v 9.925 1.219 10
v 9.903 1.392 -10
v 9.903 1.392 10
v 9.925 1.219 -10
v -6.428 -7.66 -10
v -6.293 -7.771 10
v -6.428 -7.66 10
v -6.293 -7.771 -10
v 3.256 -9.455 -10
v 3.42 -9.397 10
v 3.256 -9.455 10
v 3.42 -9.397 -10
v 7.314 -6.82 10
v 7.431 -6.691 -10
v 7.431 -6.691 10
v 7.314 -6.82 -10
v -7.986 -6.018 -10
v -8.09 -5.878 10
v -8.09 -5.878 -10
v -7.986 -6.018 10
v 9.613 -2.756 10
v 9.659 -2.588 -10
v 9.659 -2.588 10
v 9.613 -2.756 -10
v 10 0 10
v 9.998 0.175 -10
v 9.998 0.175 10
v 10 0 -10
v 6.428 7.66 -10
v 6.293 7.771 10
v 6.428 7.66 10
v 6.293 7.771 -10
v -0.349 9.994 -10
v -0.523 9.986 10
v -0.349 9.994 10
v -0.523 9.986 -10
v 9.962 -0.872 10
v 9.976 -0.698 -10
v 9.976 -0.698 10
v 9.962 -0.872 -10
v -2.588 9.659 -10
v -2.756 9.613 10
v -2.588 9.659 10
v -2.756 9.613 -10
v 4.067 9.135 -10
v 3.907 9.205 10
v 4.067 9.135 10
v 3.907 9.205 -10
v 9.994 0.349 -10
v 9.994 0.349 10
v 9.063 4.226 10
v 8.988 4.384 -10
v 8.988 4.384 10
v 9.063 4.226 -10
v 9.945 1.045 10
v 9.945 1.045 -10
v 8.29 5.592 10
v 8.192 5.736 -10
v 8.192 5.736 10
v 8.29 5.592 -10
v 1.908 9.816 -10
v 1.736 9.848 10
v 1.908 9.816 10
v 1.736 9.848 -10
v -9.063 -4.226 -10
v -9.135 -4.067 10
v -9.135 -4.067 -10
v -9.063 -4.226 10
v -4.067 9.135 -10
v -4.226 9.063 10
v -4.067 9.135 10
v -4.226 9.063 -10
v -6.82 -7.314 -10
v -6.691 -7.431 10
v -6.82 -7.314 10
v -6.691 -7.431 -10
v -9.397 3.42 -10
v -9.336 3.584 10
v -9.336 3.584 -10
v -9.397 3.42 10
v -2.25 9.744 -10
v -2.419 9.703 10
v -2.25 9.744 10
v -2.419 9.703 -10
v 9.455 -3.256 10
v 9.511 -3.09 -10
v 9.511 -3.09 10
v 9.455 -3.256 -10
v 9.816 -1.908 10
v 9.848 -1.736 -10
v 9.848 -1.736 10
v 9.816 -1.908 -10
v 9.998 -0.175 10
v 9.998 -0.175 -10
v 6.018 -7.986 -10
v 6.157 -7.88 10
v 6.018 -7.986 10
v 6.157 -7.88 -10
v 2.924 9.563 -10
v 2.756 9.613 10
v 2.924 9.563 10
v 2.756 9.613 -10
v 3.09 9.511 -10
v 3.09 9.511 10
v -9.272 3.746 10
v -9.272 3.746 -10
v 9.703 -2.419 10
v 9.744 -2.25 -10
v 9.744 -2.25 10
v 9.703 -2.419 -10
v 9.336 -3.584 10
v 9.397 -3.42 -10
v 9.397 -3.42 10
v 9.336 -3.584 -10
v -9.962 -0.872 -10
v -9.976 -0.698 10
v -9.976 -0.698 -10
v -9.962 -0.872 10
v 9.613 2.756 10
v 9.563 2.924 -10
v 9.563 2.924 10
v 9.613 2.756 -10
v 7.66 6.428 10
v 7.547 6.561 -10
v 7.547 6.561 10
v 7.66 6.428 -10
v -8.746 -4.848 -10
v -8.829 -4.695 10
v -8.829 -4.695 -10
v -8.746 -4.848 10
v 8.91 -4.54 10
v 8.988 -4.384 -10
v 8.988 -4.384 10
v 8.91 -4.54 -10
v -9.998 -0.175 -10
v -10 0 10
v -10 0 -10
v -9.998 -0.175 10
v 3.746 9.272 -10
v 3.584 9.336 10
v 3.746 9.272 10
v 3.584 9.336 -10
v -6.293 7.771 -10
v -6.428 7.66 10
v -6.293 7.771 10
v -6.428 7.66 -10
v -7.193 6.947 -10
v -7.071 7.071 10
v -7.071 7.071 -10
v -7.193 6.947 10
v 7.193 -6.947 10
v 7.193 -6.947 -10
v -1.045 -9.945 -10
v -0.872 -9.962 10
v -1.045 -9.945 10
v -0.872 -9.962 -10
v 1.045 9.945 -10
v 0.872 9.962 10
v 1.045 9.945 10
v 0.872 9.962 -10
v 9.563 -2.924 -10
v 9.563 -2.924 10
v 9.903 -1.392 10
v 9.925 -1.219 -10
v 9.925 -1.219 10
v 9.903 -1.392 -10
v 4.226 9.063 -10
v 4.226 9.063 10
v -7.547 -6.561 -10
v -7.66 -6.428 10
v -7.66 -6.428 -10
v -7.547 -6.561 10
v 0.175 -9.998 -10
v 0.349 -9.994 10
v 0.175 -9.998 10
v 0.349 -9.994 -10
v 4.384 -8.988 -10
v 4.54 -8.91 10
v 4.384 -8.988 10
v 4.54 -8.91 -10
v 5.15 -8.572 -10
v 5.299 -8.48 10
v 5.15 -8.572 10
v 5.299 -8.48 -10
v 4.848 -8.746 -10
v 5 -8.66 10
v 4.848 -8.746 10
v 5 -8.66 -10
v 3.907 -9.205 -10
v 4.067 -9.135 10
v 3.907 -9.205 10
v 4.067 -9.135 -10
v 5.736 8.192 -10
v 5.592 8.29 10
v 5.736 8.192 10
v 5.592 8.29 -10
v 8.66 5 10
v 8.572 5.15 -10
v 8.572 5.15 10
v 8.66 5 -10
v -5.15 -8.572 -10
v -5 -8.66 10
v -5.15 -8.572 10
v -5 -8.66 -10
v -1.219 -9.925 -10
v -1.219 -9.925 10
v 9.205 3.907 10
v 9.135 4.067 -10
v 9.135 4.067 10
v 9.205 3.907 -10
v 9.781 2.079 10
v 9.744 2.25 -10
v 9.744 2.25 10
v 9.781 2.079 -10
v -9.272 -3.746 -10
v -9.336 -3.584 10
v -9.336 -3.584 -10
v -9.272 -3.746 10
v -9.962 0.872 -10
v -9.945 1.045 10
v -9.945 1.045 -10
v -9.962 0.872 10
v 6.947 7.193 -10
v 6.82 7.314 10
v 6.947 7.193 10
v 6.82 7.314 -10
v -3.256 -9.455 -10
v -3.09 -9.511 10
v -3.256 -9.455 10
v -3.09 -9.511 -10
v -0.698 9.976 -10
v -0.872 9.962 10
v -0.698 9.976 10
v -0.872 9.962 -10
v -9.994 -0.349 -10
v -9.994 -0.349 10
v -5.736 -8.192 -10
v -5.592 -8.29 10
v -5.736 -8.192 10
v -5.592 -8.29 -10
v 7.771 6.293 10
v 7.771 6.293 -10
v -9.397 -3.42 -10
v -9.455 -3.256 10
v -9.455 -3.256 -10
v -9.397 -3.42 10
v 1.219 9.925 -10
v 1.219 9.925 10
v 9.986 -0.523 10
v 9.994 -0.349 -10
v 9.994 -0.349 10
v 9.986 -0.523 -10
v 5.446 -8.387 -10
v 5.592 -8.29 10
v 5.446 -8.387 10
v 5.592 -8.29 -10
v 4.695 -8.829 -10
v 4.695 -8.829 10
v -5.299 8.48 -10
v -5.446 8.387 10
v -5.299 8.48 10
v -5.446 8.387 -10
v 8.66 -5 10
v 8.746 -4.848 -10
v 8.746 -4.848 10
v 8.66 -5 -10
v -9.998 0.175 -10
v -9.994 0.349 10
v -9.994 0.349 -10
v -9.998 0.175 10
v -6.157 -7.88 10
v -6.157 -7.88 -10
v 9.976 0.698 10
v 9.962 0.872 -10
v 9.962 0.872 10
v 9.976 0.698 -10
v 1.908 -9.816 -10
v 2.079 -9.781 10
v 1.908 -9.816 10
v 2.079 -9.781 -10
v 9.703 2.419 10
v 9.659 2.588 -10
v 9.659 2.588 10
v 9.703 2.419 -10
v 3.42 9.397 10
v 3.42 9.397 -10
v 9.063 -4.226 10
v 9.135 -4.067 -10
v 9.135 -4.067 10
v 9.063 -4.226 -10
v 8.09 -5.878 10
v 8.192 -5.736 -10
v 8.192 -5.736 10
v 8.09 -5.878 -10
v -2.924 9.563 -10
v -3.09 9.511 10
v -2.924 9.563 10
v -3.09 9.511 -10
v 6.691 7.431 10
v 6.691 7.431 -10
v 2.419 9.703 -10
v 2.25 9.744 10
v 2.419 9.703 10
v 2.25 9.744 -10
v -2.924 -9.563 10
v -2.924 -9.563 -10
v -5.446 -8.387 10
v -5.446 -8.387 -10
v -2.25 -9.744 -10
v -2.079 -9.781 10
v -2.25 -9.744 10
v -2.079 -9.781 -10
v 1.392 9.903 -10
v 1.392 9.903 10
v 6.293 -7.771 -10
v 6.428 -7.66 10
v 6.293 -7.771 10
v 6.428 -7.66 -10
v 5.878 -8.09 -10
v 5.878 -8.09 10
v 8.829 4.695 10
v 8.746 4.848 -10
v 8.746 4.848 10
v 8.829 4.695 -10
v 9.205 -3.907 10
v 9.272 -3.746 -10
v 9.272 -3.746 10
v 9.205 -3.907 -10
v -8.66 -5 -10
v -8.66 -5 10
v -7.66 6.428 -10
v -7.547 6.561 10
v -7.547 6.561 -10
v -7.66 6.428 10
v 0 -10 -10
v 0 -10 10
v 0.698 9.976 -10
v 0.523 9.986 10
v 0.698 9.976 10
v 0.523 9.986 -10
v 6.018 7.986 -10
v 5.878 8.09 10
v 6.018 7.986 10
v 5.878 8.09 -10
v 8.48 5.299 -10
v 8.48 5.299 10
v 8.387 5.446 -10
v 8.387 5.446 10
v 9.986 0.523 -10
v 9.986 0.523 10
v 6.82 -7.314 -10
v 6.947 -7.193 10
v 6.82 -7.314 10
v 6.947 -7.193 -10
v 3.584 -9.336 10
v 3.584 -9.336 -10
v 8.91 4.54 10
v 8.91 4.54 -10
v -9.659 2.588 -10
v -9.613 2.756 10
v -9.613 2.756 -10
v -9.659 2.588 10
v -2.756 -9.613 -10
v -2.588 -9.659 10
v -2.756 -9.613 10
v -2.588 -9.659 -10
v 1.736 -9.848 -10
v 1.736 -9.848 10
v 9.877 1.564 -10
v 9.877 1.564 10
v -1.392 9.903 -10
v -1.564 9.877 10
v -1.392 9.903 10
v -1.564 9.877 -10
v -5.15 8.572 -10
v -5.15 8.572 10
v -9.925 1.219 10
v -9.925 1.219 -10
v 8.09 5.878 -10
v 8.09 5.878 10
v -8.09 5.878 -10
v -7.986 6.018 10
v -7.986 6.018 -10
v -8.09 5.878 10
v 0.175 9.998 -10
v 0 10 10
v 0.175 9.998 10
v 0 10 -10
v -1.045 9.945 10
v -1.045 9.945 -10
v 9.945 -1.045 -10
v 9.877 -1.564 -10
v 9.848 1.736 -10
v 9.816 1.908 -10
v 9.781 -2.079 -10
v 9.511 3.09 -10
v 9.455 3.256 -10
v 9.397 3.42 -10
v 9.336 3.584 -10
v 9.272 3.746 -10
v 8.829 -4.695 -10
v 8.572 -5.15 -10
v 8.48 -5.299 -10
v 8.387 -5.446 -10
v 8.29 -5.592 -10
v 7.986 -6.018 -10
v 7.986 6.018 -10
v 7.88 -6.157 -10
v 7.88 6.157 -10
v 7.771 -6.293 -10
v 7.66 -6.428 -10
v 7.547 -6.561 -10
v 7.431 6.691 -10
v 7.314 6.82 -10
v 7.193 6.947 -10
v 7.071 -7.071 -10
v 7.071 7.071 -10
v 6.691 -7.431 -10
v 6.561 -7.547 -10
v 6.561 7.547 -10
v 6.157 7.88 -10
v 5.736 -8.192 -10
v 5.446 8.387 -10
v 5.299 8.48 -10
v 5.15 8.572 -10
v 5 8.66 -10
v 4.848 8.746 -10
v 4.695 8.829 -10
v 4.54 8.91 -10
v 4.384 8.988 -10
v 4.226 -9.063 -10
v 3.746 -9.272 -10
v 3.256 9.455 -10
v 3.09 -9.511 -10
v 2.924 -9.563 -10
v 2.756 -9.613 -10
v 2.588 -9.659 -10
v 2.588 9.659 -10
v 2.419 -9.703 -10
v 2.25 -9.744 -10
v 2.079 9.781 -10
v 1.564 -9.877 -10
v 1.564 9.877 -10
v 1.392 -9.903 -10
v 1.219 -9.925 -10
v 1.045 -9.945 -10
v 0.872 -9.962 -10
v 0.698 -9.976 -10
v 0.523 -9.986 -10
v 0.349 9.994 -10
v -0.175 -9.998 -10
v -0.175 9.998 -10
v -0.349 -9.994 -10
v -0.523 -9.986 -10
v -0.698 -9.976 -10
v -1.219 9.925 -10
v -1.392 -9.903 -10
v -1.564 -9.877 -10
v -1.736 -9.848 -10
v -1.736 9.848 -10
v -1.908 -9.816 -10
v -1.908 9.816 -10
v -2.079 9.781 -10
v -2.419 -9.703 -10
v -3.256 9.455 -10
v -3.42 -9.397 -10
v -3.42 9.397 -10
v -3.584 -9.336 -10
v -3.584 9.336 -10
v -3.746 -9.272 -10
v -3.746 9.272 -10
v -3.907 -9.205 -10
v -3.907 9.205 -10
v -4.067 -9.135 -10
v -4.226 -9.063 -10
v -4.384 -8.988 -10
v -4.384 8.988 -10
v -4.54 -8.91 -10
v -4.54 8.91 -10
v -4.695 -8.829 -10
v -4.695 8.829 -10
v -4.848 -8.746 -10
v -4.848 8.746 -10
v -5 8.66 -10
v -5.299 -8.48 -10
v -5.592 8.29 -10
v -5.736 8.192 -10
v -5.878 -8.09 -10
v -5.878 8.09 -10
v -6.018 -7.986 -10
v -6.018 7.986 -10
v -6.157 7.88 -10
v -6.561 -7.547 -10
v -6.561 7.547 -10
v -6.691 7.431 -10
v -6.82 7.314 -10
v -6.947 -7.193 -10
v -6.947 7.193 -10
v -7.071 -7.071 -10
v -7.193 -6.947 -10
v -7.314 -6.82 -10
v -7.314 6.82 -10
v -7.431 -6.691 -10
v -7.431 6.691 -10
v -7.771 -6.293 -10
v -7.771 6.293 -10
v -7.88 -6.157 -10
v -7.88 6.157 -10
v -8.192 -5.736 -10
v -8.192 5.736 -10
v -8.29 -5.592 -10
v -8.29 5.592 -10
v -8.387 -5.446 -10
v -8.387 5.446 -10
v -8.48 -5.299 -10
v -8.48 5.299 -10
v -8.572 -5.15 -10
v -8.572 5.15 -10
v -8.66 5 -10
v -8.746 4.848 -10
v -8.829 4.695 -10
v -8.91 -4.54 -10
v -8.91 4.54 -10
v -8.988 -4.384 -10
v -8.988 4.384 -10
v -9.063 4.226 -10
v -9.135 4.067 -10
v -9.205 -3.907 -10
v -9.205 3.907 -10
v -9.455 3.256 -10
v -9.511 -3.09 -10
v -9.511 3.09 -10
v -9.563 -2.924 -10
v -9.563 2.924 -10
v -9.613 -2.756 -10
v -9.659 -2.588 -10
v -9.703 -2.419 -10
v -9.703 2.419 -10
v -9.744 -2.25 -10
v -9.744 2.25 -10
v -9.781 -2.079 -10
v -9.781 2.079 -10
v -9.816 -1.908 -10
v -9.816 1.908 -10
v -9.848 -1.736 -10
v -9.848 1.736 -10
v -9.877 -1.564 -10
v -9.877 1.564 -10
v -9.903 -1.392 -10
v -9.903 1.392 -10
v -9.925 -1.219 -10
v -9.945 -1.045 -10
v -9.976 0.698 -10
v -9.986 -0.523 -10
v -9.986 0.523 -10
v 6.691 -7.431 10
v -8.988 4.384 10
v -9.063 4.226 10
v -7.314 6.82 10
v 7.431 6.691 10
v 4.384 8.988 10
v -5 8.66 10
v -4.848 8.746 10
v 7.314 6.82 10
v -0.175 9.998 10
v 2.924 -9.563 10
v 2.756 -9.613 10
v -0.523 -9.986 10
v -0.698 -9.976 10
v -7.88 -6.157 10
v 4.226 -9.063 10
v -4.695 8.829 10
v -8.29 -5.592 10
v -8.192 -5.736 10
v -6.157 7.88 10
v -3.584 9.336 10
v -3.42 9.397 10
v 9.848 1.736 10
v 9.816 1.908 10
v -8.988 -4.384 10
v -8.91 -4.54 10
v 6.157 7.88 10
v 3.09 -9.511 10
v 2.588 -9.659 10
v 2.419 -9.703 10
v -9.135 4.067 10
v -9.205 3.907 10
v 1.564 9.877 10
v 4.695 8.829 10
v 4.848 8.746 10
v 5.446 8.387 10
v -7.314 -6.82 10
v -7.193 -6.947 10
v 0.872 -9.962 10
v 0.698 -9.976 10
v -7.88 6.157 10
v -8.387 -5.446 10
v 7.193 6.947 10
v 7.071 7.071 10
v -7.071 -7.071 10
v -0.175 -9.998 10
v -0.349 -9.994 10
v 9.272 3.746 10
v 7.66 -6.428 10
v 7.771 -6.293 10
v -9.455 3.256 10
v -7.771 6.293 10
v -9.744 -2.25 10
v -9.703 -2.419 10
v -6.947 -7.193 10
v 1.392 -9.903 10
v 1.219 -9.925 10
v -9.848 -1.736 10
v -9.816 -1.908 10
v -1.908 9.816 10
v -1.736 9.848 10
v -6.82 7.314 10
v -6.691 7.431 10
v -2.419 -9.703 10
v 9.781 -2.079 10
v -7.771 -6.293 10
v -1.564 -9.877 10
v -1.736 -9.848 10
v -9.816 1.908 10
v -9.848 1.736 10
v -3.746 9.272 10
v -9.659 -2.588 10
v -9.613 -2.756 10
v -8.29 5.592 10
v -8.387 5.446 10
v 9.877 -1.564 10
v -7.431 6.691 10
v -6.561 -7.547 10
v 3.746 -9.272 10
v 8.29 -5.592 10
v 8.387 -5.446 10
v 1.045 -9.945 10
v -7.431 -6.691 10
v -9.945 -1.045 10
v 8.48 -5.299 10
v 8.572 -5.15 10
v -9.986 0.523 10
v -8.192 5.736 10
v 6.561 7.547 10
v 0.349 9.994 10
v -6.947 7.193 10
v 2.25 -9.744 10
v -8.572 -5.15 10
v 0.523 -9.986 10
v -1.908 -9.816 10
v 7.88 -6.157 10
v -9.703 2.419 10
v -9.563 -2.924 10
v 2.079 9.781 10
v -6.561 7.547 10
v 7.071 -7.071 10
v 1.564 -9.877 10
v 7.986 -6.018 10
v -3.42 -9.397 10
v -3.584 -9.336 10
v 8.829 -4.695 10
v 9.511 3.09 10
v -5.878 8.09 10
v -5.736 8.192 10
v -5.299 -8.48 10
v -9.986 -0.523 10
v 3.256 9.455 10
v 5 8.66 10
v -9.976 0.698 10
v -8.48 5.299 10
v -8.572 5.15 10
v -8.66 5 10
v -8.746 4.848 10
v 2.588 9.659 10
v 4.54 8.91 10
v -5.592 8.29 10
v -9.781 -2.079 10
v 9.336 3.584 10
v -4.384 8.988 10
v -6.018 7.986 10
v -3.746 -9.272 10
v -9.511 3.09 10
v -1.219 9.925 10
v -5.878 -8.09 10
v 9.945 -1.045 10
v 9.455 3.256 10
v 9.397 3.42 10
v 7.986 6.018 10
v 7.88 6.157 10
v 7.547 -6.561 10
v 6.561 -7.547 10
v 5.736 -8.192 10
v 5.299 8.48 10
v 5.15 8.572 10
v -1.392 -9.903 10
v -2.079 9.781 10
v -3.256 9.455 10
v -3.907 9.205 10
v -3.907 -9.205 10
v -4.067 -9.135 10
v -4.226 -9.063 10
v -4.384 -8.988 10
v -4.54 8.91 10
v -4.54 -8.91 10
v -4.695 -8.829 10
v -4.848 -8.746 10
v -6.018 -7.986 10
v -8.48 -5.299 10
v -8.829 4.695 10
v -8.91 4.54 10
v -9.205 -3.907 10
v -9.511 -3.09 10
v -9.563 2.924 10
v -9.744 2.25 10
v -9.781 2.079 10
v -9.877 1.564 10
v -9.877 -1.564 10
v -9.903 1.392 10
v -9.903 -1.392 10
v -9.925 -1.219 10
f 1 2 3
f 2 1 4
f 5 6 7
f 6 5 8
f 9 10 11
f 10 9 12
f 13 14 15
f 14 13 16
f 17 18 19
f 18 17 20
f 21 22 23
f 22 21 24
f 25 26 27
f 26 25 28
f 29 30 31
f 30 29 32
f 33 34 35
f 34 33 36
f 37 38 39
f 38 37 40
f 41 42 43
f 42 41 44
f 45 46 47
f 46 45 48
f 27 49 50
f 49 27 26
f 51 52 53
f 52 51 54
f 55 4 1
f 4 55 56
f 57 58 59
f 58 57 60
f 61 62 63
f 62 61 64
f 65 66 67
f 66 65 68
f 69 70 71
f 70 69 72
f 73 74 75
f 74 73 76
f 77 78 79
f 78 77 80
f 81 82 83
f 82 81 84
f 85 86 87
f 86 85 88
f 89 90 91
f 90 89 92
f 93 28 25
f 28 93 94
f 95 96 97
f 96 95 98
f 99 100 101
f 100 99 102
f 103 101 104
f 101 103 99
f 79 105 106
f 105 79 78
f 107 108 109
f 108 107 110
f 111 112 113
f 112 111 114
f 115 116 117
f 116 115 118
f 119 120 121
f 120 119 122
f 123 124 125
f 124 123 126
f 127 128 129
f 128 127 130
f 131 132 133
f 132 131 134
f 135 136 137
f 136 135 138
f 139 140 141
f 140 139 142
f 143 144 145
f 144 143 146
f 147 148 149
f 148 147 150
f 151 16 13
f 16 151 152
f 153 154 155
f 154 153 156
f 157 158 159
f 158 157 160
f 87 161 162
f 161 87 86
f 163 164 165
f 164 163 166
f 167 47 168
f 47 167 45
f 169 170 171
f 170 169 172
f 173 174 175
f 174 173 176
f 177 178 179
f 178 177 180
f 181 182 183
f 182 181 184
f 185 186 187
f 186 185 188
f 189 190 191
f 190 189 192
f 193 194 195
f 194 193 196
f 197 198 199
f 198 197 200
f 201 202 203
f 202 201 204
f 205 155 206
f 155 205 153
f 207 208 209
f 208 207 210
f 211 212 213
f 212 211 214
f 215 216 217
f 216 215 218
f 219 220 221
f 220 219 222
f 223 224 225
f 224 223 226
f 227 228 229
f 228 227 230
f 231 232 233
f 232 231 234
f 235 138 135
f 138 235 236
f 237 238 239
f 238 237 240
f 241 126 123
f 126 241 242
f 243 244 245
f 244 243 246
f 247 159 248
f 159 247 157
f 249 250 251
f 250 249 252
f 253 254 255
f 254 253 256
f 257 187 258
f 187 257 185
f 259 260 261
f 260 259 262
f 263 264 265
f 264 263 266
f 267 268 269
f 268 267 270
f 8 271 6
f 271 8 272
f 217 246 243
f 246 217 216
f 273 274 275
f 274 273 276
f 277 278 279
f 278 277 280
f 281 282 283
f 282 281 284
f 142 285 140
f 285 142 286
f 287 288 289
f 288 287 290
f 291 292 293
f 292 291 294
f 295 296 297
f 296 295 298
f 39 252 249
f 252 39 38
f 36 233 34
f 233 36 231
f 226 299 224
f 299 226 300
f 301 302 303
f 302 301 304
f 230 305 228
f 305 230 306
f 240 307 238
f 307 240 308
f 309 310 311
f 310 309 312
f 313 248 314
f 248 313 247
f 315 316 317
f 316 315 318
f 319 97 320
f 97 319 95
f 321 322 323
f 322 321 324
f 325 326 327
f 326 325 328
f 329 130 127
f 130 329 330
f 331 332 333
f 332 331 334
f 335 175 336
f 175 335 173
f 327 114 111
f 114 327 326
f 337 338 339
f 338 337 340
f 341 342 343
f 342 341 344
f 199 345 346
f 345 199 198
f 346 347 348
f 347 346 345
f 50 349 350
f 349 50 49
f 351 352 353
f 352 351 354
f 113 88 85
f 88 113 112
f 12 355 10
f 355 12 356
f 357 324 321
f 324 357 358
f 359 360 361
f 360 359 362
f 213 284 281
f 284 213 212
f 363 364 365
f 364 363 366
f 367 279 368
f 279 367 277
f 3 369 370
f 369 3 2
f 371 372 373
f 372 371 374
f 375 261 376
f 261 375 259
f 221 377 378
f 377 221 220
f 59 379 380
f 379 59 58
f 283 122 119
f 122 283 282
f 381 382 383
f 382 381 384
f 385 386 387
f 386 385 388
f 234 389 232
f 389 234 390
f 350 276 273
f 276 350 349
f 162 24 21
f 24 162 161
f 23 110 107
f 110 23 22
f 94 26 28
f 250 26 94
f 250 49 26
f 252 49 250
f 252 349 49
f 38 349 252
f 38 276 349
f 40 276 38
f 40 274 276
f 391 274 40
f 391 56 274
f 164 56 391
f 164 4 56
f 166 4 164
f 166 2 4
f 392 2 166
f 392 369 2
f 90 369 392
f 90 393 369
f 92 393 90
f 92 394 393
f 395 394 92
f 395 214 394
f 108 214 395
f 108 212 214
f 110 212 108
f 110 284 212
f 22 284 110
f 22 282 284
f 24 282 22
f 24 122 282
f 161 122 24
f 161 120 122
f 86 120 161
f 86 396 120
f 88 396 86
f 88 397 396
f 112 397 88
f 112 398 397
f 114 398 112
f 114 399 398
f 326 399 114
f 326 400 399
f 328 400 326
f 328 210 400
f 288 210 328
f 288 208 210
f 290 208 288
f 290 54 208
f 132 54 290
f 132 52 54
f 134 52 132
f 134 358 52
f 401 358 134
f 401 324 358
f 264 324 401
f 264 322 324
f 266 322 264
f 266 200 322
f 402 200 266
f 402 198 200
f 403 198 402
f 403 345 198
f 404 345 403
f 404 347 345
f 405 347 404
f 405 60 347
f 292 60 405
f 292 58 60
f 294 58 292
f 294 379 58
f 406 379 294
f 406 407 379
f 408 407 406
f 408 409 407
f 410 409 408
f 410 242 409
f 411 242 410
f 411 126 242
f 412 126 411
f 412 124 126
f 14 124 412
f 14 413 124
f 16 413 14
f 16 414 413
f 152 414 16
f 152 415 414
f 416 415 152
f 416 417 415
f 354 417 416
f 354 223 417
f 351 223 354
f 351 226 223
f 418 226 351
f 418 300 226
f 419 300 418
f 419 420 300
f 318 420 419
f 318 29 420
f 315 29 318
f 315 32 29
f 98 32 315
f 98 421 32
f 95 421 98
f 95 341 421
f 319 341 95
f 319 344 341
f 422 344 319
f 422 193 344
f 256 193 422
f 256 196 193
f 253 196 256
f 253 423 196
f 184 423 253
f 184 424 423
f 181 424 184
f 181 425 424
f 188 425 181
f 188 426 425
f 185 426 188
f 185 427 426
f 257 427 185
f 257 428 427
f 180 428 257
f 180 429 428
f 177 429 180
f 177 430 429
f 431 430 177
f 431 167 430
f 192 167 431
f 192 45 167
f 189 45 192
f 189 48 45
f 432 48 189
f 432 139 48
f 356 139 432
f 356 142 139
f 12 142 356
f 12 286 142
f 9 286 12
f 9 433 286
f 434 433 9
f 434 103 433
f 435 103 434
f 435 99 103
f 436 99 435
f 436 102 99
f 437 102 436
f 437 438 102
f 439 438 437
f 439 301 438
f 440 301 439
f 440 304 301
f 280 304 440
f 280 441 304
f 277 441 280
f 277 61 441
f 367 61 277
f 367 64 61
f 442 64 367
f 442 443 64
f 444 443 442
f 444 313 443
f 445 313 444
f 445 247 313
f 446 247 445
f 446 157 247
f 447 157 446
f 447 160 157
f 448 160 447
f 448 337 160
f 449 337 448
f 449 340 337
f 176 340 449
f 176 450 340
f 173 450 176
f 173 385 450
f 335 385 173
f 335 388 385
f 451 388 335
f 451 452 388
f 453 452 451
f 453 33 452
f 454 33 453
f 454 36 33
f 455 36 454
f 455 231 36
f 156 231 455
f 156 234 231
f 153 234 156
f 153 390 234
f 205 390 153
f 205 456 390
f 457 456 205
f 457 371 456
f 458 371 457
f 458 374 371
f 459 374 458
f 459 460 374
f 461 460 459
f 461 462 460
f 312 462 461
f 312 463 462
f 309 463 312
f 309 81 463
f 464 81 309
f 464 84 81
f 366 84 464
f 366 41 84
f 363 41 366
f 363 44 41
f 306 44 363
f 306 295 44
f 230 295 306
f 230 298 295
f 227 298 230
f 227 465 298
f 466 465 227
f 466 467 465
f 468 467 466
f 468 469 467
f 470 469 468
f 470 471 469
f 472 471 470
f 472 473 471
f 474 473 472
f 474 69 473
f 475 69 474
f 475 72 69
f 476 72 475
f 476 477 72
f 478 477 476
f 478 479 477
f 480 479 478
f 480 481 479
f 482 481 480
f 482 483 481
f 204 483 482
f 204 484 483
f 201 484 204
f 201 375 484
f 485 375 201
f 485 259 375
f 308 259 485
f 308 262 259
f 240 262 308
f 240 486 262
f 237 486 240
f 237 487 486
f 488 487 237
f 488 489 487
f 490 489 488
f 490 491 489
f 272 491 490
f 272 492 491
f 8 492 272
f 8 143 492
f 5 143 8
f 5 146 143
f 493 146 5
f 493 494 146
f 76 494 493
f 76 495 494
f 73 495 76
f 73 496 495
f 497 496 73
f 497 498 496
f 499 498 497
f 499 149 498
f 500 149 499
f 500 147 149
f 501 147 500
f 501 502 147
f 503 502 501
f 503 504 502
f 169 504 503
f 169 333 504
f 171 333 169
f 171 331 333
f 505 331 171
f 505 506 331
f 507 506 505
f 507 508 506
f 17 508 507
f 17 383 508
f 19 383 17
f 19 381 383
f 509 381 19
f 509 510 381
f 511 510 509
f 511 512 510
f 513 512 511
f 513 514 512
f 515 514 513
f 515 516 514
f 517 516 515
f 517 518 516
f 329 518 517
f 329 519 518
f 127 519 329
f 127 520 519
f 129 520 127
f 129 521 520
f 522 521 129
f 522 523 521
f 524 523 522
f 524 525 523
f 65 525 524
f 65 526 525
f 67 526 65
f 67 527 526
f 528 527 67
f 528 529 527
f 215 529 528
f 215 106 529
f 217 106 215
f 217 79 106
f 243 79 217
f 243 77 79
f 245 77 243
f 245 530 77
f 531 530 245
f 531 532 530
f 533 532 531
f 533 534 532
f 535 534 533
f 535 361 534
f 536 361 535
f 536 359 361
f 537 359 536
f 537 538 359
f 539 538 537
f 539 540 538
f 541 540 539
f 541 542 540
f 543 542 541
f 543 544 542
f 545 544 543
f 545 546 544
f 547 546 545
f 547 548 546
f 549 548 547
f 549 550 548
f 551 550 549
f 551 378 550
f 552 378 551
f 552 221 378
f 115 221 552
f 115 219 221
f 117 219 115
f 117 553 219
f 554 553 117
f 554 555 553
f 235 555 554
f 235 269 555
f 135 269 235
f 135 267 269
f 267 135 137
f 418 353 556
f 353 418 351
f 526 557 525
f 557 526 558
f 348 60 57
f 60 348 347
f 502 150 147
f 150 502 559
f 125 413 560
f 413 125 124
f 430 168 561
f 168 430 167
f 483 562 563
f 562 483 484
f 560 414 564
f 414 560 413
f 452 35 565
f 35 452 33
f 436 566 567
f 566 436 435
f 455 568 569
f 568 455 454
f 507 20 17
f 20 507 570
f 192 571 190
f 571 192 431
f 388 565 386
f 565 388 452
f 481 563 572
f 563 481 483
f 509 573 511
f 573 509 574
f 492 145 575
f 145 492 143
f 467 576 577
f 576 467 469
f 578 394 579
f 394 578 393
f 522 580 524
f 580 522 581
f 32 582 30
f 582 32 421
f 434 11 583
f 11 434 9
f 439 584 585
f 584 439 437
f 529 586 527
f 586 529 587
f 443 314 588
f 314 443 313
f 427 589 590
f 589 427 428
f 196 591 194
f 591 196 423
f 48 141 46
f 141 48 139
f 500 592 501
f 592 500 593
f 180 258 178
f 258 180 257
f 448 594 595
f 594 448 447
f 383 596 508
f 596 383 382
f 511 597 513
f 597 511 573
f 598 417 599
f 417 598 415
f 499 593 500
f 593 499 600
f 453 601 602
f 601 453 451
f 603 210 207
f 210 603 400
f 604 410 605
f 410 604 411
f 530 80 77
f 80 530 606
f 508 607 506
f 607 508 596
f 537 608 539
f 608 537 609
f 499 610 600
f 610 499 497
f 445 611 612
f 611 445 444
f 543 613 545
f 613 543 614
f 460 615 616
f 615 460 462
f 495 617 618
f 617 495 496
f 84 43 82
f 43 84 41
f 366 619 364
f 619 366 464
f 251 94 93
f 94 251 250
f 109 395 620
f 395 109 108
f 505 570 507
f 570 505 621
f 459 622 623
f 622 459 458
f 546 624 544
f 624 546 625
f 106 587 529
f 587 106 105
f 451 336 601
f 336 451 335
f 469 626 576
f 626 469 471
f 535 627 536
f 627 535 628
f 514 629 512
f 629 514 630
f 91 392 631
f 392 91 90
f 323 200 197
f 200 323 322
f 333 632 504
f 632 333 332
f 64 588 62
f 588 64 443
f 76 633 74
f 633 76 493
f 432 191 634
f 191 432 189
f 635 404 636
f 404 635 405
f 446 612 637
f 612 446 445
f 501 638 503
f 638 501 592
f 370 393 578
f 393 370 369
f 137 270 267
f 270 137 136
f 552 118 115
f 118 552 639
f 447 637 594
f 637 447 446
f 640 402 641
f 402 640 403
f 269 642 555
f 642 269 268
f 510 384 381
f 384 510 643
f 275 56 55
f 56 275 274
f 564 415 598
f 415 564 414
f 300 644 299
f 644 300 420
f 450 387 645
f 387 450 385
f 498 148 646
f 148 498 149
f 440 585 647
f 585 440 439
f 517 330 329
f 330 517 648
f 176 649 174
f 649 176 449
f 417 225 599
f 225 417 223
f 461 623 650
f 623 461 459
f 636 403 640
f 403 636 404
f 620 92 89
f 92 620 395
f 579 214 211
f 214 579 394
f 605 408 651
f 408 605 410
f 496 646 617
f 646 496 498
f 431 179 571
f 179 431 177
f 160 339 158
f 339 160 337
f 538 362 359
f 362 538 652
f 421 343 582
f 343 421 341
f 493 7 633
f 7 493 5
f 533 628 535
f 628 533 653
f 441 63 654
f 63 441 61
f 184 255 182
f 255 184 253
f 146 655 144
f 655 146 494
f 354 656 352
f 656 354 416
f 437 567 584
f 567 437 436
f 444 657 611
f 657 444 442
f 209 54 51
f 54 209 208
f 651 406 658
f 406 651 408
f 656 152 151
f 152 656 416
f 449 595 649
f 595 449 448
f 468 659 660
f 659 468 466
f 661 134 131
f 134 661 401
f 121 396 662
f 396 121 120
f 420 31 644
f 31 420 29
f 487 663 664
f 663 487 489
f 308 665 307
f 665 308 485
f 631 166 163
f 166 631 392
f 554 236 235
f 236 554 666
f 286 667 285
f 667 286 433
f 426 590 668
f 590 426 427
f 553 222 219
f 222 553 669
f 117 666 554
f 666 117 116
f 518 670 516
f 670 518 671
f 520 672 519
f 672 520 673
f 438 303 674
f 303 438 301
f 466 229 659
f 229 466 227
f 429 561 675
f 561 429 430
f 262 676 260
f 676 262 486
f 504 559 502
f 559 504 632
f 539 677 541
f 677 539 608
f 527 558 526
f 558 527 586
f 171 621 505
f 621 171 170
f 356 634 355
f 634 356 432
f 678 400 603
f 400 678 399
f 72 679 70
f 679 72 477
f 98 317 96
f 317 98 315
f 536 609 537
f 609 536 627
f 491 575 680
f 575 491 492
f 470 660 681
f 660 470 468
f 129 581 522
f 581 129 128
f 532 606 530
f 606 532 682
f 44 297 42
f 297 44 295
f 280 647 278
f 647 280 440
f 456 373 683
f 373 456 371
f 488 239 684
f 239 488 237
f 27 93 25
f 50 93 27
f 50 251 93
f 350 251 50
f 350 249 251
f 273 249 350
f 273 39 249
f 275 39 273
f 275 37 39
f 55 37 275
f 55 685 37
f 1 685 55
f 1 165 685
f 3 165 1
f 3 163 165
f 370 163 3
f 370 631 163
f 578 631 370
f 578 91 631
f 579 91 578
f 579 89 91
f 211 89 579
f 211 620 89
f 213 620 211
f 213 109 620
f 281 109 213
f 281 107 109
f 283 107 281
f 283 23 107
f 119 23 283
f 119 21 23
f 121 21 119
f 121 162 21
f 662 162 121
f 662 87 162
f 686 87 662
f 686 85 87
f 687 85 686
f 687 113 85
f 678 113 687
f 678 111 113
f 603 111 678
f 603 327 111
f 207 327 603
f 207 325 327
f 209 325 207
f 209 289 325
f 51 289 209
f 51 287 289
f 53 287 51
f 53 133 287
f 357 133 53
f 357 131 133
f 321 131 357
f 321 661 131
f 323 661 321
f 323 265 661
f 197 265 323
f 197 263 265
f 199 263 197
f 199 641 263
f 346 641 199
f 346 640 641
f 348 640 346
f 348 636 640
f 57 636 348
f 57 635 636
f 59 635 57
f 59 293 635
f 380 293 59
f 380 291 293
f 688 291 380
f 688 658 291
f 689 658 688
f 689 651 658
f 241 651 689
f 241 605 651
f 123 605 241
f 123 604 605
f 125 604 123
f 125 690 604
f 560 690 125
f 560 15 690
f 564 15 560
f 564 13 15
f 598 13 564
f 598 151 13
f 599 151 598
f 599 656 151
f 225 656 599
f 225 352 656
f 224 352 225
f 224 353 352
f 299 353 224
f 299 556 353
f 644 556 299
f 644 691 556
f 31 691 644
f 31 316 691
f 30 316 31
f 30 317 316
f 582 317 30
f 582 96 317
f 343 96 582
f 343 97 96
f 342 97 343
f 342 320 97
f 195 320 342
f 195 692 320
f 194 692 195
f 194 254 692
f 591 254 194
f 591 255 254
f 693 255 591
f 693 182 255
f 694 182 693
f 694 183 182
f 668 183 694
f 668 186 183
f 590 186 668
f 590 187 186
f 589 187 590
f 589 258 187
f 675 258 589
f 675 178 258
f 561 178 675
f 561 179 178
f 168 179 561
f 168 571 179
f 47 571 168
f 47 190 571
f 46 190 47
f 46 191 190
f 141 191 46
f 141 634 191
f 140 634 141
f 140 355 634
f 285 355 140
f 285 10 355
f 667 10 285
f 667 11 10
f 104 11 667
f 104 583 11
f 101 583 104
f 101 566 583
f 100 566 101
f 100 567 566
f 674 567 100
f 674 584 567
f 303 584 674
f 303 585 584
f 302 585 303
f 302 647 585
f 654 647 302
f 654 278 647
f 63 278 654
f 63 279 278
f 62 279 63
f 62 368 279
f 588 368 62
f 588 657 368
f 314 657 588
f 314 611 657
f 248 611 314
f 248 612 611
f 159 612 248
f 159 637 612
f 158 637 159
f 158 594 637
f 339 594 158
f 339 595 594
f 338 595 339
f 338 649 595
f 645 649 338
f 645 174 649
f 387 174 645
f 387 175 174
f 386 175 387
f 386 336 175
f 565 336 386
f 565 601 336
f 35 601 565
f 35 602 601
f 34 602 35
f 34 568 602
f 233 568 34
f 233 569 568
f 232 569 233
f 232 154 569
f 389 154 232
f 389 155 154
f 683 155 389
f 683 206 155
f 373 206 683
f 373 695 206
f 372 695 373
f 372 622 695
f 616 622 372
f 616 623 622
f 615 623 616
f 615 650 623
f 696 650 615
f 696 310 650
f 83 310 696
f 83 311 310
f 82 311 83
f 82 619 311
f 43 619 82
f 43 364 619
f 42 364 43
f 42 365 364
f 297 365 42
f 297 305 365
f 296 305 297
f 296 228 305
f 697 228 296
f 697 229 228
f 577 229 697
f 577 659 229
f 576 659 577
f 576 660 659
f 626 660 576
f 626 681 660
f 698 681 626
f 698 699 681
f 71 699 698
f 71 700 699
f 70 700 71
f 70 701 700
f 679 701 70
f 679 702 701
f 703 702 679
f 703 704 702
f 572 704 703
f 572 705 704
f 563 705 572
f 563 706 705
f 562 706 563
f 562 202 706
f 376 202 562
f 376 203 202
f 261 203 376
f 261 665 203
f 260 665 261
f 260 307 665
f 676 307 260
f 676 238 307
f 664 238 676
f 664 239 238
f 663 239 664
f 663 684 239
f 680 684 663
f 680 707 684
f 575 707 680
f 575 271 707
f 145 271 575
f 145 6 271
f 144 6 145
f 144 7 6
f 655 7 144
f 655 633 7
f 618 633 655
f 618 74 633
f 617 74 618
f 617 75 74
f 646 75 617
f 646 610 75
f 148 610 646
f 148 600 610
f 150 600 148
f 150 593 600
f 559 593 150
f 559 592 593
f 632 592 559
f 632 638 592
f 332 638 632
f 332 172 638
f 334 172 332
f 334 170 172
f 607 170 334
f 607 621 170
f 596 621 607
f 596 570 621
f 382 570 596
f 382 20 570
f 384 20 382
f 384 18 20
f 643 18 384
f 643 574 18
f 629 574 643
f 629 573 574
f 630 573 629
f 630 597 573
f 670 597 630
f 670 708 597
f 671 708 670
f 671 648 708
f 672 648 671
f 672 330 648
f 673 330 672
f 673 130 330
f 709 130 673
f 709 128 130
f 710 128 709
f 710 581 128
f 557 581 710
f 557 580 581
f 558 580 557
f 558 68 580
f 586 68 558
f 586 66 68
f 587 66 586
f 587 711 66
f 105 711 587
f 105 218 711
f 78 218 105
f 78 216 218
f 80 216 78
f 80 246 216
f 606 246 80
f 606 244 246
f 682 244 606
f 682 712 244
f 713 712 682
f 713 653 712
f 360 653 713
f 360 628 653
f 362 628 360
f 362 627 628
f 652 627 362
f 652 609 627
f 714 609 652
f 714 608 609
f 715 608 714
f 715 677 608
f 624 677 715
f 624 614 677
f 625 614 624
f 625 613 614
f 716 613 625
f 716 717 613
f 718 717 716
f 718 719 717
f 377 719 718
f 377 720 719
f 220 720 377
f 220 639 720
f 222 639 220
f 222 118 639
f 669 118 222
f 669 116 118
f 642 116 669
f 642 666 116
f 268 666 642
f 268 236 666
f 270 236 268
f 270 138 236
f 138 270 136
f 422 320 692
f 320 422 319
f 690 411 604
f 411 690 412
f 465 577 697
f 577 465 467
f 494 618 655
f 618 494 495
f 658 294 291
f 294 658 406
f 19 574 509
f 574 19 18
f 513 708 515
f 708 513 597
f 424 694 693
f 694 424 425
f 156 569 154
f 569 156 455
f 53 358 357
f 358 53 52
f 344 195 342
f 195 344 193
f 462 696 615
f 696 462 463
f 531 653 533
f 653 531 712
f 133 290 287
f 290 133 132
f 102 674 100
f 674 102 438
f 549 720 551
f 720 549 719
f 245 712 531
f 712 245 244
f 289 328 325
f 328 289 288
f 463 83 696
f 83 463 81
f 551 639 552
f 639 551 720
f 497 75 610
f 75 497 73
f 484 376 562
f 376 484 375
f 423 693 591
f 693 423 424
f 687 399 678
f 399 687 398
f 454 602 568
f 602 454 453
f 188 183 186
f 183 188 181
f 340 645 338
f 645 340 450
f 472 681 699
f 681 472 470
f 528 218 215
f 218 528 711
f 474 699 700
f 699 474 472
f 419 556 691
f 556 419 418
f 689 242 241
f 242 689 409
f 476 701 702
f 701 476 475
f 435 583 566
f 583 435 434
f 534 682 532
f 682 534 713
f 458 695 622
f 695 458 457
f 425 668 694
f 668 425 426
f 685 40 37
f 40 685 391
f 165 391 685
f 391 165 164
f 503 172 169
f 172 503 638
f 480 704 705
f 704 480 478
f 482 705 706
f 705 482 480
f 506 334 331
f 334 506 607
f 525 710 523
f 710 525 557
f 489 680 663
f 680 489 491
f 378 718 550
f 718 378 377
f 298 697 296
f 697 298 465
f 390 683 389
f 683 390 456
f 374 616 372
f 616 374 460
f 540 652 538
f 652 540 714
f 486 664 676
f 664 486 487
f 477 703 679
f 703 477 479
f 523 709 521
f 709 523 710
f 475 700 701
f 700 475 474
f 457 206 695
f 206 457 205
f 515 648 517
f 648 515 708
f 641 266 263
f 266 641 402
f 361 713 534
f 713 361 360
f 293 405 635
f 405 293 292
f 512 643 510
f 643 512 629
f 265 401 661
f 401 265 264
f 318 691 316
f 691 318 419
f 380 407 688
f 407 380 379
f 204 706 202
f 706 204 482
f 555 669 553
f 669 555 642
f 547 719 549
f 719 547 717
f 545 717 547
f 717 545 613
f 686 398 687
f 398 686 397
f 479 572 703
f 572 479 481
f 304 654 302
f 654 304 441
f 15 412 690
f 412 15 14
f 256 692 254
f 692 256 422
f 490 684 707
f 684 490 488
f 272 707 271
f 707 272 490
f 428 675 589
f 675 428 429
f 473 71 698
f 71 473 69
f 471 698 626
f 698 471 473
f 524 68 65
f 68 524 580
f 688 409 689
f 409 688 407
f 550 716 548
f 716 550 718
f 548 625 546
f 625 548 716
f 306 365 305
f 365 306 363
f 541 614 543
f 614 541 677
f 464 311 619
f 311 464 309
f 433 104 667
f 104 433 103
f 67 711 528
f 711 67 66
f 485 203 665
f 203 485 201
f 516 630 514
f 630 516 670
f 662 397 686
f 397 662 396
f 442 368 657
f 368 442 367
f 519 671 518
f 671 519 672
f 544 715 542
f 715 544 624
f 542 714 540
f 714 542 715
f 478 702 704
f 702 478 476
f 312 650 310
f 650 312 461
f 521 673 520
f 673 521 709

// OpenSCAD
// file: variables.scad
/*
 ******************************************************************************************
 *                               Variables for autoclaves                                 *
 ******************************************************************************************
 *                                                                                        *
 * Usage:                                                                                 *
 *   include <variables.scad>                                                             *
 *                                                                                        *
 ******************************************************************************************
 */


/*
 ******************************************************************************************
 *                               Universal variables                                      *
 ******************************************************************************************
 */
h_wall = 2;


/*
 ******************************************************************************************
 *                               Rounded autoclave                                        *
 ******************************************************************************************
 */
d_insideSphere = 15;

h_insideCylinder_ROUND = 3;

d_outsideCylinder_ROUND = d_insideSphere + h_wall*2;
h_outsideCylinder_ROUND = d_insideSphere + h_insideCylinder_ROUND + h_wall*2;

fn_insideSphere = 360;


/*
 ******************************************************************************************
 *                               Cone autoclave                                           *
 ******************************************************************************************
 */
d1_insideCuttedCone = 16;
d2_insideCuttedCone = 3;
h_insideCuttedCone = 5;

h_insideCylinder_CONE = 6;

d_outsideCylinder_CONE = d1_insideCuttedCone + h_wall*2;
h_outsideCylinder_CONE = h_insideCuttedCone*2 + h_insideCylinder_CONE + h_wall*2;

fn_insideCone = 360;

/*
 ******************************************************************************************
 *                               Cone autoclave                                           *
 ******************************************************************************************
 */
h_hatCylinder = 5;
// main file
/*
 ******************************************************************************************
 *                                                                                        *
 *                     The autoclave with cutted cone form inside                         *
 *                                                                                        *
 ******************************************************************************************
 * The cutted cone volume:                                                                *
 *   V (cut. cone) = 1/3 * pi * h(cone) * (r1^2 + r1 * r2 + r2^2)                         *
 *                                                                                        *
 * Therefore the volume of two cutted cone plus the cylinder is:                          *
 *   V (full) = 2/3 * pi * h(cone) * (r1^2 + r1 * r2 + r2^2) + pi * H(cylinder) * r1^2    *
 *                                                                                        *
 * From WolframAlpha:                                                                     *
 *   V = 2/3* pi*5*(8^2 + 8*1.5 + 1.5^2) + pi*6*8^2 = 2025                                *
 ******************************************************************************************
 */


/*
 ******************************************************************************************
 *                               Variables                                                *
 ******************************************************************************************
 */
include <variables.scad>


/*
 ******************************************************************************************
 * Set SHOW to true to look inside the cylinder.                                          *
 * Otherwise set SHOW to false to the final rendering.                                    *
 ******************************************************************************************
 */
SHOW = true;


/*
 ******************************************************************************************
 *                               Modules                                                  *
 ******************************************************************************************
 */
module insideVolume()
{
	module insideCuttedCone()
	{
		translate([0, 0, h_insideCylinder_CONE/2]) cylinder(d1 = d1_insideCuttedCone, d2 =
		d2_insideCuttedCone, h = h_insideCuttedCone, $fn=fn_insideCone, center=false);
	}

	insideCuttedCone();
	mirror([0,0,1]) insideCuttedCone();

	cylinder(h = h_insideCylinder_CONE, d = d1_insideCuttedCone, $fn=fn_insideCone, center=true);
}


/*
 ******************************************************************************************
 *                               Two Kind of Main                                         *
 ******************************************************************************************
 */
module diffMain()
{
	difference()
	{
		cylinder(d = d_outsideCylinder_CONE, h = h_outsideCylinder_CONE, $fn=fn_insideCone, center=true);
		insideVolume();
	}
}


module showMain()
{
		insideVolume();
		#cylinder(d = d_outsideCylinder_CONE, h = h_outsideCylinder_CONE, $fn=fn_insideCone, center=true);
}


module main()
{
	if (SHOW)
	{
		showMain();
	}
	else
		diffMain();
}


/*
 ******************************************************************************************
 *                                     Main                                               *
 ******************************************************************************************
 */
main();
